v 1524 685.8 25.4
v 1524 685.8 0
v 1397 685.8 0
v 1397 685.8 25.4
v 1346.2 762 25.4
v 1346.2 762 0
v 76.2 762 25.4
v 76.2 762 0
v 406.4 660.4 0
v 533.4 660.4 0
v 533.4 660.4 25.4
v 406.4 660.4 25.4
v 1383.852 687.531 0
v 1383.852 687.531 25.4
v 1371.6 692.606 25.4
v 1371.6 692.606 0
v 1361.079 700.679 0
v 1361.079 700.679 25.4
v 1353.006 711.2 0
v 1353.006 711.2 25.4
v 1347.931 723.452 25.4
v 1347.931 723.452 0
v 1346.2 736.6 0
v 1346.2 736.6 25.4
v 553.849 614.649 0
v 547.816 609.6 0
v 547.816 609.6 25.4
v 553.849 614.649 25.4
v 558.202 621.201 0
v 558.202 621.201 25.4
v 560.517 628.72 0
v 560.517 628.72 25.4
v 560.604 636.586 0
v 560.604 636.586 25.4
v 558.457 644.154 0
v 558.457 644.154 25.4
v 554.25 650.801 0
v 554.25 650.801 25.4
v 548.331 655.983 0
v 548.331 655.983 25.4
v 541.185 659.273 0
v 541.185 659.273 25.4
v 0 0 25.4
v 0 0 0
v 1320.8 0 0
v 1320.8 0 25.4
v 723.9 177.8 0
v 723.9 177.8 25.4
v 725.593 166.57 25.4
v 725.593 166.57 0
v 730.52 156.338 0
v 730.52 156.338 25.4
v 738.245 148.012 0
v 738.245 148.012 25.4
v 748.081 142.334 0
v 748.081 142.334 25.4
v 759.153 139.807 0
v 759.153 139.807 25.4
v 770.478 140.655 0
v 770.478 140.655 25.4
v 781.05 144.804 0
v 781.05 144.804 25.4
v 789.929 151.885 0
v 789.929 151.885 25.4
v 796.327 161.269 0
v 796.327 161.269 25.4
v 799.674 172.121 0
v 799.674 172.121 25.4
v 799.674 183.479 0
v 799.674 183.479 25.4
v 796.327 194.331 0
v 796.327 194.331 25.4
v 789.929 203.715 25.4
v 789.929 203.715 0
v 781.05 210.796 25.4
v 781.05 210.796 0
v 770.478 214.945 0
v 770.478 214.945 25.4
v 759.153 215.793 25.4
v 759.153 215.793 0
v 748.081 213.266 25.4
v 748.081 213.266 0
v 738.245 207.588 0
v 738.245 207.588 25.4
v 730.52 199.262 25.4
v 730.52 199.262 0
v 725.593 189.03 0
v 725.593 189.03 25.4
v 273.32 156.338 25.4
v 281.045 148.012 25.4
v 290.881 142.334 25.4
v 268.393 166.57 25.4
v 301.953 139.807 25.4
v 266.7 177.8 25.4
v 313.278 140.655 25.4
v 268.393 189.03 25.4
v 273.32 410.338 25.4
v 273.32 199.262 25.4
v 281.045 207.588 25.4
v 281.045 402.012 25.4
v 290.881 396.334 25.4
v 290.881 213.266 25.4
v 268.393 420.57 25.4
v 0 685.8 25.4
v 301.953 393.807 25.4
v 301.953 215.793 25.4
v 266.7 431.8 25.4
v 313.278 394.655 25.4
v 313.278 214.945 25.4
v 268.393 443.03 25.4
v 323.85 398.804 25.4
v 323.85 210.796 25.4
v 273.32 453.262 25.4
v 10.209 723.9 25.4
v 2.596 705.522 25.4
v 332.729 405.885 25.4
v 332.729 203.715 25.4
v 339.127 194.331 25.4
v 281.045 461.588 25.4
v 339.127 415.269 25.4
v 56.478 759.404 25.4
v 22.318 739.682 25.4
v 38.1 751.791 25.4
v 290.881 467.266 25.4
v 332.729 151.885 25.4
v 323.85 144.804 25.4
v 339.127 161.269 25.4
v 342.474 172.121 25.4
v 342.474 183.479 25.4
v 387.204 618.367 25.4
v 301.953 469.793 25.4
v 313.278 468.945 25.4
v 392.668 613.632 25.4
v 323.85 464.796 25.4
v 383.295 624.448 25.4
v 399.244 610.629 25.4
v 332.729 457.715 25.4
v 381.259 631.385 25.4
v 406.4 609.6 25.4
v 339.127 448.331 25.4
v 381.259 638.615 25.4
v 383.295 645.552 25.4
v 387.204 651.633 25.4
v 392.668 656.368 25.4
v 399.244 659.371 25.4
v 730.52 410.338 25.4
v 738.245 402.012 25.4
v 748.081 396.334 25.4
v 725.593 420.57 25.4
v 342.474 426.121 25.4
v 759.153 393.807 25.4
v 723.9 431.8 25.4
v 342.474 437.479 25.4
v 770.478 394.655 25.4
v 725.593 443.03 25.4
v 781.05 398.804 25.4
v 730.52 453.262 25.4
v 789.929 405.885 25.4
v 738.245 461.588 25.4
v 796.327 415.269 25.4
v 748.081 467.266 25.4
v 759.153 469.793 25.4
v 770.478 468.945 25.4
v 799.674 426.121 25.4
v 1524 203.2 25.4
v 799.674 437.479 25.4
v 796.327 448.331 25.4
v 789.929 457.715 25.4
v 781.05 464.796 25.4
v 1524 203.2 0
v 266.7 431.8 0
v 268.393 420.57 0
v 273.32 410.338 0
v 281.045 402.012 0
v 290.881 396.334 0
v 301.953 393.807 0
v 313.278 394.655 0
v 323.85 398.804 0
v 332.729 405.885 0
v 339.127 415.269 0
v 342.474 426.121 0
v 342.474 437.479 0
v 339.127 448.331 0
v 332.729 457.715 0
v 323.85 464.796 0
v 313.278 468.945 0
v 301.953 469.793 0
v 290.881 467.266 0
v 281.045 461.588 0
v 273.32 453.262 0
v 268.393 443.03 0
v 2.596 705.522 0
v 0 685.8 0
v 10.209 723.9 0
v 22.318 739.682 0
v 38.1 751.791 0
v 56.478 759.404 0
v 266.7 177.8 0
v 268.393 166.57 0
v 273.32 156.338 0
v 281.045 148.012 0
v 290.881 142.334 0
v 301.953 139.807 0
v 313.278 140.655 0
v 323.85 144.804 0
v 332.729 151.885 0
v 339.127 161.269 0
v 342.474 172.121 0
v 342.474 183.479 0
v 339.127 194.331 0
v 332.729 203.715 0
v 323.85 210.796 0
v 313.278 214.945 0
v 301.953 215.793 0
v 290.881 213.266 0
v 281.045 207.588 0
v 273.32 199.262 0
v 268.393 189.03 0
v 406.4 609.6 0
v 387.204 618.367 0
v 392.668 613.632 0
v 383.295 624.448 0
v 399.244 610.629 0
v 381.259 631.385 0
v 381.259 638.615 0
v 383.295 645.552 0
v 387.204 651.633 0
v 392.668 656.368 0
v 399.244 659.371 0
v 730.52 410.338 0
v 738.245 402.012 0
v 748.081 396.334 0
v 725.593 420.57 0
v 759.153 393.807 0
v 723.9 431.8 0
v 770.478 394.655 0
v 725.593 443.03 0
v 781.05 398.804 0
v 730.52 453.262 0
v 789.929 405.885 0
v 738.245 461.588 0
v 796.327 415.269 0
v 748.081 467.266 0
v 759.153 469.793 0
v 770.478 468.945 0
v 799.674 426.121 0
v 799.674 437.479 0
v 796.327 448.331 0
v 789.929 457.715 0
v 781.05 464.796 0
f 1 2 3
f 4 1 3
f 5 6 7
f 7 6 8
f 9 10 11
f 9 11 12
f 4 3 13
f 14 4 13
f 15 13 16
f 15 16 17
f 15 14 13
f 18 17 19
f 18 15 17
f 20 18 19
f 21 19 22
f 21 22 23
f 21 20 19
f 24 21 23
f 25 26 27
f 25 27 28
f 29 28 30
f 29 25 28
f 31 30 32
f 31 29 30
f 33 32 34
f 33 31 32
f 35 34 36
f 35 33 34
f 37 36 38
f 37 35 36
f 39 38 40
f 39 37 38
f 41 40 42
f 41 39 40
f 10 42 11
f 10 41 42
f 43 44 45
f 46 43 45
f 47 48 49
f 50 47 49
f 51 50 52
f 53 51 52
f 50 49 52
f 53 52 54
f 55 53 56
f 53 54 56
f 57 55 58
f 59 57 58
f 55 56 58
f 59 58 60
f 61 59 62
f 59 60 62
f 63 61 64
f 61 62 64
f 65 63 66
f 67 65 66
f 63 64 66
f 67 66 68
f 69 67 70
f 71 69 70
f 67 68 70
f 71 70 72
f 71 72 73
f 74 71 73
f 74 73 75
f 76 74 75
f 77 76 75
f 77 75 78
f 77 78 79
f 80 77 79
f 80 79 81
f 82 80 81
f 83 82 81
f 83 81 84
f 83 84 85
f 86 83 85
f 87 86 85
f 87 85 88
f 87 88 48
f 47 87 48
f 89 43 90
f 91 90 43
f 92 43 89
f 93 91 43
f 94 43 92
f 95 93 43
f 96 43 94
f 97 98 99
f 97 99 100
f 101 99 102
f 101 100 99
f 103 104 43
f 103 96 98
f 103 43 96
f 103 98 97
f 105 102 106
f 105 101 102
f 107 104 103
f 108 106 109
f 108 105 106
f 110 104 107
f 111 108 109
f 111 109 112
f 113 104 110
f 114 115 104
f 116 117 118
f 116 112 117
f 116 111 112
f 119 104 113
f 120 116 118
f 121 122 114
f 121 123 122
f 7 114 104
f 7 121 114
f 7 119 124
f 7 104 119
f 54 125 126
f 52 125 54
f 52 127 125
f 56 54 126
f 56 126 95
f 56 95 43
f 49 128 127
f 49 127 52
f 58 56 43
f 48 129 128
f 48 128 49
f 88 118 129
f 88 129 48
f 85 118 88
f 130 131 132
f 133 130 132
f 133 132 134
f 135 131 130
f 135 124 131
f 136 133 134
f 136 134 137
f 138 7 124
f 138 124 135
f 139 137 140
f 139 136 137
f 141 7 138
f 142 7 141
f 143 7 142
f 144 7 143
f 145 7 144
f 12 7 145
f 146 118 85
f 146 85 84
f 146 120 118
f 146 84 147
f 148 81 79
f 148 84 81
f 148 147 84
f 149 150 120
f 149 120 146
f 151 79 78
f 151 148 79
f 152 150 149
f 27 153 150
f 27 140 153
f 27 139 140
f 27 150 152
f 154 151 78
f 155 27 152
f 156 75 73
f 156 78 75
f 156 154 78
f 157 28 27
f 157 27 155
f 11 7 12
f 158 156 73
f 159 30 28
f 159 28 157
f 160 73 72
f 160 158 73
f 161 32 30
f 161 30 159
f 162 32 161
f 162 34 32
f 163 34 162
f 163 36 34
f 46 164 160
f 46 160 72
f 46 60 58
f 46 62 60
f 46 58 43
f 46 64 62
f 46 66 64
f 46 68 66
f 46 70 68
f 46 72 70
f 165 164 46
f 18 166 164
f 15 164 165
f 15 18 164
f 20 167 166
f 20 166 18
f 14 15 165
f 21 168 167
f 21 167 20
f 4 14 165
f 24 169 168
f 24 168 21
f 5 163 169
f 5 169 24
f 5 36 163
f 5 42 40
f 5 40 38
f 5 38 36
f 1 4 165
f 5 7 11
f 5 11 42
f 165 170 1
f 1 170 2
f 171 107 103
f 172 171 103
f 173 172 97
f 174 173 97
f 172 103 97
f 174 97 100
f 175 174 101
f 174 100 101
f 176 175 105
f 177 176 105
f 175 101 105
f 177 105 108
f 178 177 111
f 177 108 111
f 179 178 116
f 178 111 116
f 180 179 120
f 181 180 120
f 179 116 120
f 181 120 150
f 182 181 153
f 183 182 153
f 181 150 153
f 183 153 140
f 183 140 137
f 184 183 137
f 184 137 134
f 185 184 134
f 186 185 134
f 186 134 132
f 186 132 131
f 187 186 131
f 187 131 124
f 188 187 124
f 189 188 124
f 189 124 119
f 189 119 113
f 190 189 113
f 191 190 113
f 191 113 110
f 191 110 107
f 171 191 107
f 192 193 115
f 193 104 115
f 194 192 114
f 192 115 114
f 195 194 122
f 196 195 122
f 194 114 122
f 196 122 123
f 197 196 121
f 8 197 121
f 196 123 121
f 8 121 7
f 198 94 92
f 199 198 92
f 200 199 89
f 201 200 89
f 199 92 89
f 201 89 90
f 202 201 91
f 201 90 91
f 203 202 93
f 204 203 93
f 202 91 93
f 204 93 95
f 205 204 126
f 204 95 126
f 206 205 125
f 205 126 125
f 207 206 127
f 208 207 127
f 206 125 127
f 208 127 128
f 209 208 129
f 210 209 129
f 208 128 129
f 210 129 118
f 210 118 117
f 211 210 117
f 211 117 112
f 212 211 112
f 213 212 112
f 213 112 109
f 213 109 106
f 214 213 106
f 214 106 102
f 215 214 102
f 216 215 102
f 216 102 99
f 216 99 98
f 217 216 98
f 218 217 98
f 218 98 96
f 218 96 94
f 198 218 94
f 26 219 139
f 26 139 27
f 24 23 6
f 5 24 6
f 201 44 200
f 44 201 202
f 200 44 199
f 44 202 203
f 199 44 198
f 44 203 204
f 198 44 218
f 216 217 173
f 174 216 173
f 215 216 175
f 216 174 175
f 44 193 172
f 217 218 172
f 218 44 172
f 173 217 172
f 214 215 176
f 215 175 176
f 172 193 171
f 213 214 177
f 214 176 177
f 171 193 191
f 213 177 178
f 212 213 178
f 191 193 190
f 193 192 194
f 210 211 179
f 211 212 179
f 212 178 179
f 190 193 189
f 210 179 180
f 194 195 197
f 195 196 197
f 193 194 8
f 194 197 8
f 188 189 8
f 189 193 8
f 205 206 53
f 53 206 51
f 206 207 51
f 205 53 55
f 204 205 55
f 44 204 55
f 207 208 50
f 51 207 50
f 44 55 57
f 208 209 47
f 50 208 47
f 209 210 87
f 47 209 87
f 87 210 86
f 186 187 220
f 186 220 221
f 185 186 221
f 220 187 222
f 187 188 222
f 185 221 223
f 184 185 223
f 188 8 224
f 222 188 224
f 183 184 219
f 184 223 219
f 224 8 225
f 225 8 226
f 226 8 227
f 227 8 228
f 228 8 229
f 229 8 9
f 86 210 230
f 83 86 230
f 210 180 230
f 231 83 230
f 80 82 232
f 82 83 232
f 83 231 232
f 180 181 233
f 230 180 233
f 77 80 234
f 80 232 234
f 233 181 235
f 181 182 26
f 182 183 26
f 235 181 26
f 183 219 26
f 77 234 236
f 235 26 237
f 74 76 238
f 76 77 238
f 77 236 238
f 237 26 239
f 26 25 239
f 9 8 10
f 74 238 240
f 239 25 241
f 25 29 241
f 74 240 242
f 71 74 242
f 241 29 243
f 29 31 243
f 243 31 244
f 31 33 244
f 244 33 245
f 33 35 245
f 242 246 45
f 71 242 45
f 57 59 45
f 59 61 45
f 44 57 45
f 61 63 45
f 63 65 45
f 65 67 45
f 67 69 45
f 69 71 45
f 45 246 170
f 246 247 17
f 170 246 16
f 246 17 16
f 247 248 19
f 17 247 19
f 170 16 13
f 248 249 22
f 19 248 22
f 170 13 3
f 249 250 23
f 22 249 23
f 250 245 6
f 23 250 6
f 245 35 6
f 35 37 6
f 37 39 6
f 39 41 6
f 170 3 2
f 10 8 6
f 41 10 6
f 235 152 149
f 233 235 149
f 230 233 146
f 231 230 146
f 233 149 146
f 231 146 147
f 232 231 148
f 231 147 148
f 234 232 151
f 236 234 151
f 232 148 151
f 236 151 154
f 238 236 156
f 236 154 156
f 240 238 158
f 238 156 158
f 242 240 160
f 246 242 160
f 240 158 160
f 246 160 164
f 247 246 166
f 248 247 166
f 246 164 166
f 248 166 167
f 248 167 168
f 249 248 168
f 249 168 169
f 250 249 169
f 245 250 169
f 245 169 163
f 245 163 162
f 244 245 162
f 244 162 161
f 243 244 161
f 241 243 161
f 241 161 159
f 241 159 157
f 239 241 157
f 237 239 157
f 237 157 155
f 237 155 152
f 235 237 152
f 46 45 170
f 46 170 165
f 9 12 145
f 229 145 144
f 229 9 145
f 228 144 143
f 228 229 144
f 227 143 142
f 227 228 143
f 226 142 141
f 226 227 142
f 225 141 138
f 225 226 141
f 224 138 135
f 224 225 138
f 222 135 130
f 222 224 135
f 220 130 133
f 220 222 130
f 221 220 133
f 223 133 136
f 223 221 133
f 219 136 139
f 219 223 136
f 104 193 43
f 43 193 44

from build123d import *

# Parameters (mm, degrees)
F1_DEPTH = 25.4
F2_D     = 76.2
F3_R     = 76.2
F4_SIZE  = 203.2
F5_R     = 50.8
F7_DEPTH = 25.401


with BuildPart() as f1:
    # F0 (on Top) → F1 (new body)
    with BuildSketch(Plane.XY):
        Polygon((0, 762), (0, 0), (1524, 0), (1524, 685.8), (1346.2, 685.8), (1346.2, 762), align=None)
    extrude(amount=F1_DEPTH)

    # F2 (through all)
    with Locations(Plane(origin=(0, 0, 0), x_dir=(1, 0, 0), z_dir=(0, 0, -1))):
        with Locations((304.8, -177.8), (304.8, -431.8), (762, -431.8), (762, -177.8)):
            Hole(F2_D / 2)

    # F3
    f3_edges = [f1.edges().sort_by_distance(p)[0] for p in [
        (0, 762, 12.7),
    ]]
    fillet(f3_edges, radius=F3_R)

    # F4
    f4_edges = [f1.edges().sort_by_distance(p)[0] for p in [
        (1524, 0, 12.7),
    ]]
    chamfer(f4_edges, length=F4_SIZE)

    # F5
    f5_edges = [f1.edges().sort_by_distance(p)[0] for p in [
        (1346.2, 685.8, 12.7),
    ]]
    fillet(f5_edges, radius=F5_R)

    # F6 (on Top) → F7 (cut, through all)
    with BuildSketch(Plane.XY):
        with BuildLine():
            Line((533.4, 660.4), (406.4, 660.4))
            ThreePointArc((406.4, 660.4), (381, 635), (406.4, 609.6))
            Line((406.4, 609.6), (547.8161634918, 609.6))
            ThreePointArc((547.8161634918, 609.6), (559.802962759, 640.4471760412), (533.4, 660.4))
        make_face()
    extrude(amount=F7_DEPTH, mode=Mode.SUBTRACT)


solid = f1.part
